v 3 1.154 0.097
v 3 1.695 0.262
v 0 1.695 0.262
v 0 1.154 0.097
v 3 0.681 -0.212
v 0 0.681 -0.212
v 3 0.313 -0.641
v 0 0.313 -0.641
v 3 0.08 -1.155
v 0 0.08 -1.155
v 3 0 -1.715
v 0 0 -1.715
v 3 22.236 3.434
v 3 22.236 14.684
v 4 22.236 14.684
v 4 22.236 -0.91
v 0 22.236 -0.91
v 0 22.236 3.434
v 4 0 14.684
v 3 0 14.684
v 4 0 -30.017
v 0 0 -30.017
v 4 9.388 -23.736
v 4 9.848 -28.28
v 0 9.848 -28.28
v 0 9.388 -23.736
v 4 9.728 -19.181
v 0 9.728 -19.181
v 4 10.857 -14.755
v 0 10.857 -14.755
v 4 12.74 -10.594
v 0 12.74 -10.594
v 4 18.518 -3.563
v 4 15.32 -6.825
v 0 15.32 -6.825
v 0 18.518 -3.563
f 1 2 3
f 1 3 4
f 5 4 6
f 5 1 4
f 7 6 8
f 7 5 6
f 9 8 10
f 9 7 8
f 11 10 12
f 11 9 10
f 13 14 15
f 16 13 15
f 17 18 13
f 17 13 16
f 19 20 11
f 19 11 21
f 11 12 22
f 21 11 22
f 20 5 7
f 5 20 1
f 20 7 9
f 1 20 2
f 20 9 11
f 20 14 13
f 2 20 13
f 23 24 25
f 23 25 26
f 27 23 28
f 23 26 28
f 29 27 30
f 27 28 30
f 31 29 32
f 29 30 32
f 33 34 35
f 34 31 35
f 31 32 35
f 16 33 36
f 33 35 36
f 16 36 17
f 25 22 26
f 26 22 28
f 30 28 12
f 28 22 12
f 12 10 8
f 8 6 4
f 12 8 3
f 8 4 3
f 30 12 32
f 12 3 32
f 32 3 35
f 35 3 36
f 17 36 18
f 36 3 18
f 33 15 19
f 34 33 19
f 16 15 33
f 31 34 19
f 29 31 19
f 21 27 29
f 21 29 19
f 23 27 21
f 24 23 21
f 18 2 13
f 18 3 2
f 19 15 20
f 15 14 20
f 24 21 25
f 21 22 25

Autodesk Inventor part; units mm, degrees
ref_plane "YZ Plane" through (0, 0, 0) normal (1, 0, 0) x (0, 1, 0)
ref_plane "XZ Plane" through (0, 0, 0) normal (0, 1, 0) x (-1, 0, 0)
ref_plane "XY Plane" through (0, 0, 0) normal (0, 0, 1) x (1, 0, 0)
sketch "Sketch1" plane through (0, 0, 0) normal (1, 0, 0) x (0, 1, 0)
  line L0 (0, 0) -> (0, -30.0167)
  line L1 (0, 0) -> (22.2363, 3.4344)
  line L2 (22.2363, 3.4344) -> (22.2363, -0.9099)
  arc A0 (22.2363, -0.9099) -> (9.8481, -28.2802) centre (35.4748, -23.3905) ccw
  line L3 (0, -30.0167) -> (9.8481, -28.2802)
  dimension "d27" = 30.0167
  dimension "d28" = 22.5
  dimension "d29" = 98.78
  dimension "d35" = 9.8481
  dimension "d36" = 80
  dimension "d37" = 26.089
  dimension "d38" = 13.2384
extrude "Extrusion1" add sketch "Sketch1" along normal blind 3
fillet "Fillet2" radius 2 1 edges at (1.5, 0, 0)
sketch "Sketch3" plane through (3, 0, 0) normal (1, 0, 0) x (0, 0, -1)
  line L0 (-3.4344, 22.2363) -> (-0.2618, 1.6947) projected
  line L1 (-3.4344, 22.2363) -> (-14.6844, 22.2363)
  line L2 (-14.6844, 22.2363) -> (-14.6844, 0)
  line L3 (1.7148, 0) -> (30.0167, 0) projected
  line L4 (-14.6844, 0) -> (30.0167, 0)
  arc A0 (0.9099, 22.2363) -> (28.2802, 9.8481) centre (23.3905, 35.4748) ccw projected
  line L5 (-3.4344, 22.2363) -> (0.9099, 22.2363)
  arc A1 (0.9099, 22.2363) -> (28.2802, 9.8481) centre (23.3905, 35.4748) ccw
  line L6 (30.0167, 0) -> (28.2802, 9.8481) projected
  line L7 (28.2802, 9.8481) -> (30.0167, 0)
  point P0 (0, 0)
  dimension "d32" = 11.25
extrude "Extrusion3" add sketch "Sketch3" along normal blind 1
properties part number "jam-protector"
